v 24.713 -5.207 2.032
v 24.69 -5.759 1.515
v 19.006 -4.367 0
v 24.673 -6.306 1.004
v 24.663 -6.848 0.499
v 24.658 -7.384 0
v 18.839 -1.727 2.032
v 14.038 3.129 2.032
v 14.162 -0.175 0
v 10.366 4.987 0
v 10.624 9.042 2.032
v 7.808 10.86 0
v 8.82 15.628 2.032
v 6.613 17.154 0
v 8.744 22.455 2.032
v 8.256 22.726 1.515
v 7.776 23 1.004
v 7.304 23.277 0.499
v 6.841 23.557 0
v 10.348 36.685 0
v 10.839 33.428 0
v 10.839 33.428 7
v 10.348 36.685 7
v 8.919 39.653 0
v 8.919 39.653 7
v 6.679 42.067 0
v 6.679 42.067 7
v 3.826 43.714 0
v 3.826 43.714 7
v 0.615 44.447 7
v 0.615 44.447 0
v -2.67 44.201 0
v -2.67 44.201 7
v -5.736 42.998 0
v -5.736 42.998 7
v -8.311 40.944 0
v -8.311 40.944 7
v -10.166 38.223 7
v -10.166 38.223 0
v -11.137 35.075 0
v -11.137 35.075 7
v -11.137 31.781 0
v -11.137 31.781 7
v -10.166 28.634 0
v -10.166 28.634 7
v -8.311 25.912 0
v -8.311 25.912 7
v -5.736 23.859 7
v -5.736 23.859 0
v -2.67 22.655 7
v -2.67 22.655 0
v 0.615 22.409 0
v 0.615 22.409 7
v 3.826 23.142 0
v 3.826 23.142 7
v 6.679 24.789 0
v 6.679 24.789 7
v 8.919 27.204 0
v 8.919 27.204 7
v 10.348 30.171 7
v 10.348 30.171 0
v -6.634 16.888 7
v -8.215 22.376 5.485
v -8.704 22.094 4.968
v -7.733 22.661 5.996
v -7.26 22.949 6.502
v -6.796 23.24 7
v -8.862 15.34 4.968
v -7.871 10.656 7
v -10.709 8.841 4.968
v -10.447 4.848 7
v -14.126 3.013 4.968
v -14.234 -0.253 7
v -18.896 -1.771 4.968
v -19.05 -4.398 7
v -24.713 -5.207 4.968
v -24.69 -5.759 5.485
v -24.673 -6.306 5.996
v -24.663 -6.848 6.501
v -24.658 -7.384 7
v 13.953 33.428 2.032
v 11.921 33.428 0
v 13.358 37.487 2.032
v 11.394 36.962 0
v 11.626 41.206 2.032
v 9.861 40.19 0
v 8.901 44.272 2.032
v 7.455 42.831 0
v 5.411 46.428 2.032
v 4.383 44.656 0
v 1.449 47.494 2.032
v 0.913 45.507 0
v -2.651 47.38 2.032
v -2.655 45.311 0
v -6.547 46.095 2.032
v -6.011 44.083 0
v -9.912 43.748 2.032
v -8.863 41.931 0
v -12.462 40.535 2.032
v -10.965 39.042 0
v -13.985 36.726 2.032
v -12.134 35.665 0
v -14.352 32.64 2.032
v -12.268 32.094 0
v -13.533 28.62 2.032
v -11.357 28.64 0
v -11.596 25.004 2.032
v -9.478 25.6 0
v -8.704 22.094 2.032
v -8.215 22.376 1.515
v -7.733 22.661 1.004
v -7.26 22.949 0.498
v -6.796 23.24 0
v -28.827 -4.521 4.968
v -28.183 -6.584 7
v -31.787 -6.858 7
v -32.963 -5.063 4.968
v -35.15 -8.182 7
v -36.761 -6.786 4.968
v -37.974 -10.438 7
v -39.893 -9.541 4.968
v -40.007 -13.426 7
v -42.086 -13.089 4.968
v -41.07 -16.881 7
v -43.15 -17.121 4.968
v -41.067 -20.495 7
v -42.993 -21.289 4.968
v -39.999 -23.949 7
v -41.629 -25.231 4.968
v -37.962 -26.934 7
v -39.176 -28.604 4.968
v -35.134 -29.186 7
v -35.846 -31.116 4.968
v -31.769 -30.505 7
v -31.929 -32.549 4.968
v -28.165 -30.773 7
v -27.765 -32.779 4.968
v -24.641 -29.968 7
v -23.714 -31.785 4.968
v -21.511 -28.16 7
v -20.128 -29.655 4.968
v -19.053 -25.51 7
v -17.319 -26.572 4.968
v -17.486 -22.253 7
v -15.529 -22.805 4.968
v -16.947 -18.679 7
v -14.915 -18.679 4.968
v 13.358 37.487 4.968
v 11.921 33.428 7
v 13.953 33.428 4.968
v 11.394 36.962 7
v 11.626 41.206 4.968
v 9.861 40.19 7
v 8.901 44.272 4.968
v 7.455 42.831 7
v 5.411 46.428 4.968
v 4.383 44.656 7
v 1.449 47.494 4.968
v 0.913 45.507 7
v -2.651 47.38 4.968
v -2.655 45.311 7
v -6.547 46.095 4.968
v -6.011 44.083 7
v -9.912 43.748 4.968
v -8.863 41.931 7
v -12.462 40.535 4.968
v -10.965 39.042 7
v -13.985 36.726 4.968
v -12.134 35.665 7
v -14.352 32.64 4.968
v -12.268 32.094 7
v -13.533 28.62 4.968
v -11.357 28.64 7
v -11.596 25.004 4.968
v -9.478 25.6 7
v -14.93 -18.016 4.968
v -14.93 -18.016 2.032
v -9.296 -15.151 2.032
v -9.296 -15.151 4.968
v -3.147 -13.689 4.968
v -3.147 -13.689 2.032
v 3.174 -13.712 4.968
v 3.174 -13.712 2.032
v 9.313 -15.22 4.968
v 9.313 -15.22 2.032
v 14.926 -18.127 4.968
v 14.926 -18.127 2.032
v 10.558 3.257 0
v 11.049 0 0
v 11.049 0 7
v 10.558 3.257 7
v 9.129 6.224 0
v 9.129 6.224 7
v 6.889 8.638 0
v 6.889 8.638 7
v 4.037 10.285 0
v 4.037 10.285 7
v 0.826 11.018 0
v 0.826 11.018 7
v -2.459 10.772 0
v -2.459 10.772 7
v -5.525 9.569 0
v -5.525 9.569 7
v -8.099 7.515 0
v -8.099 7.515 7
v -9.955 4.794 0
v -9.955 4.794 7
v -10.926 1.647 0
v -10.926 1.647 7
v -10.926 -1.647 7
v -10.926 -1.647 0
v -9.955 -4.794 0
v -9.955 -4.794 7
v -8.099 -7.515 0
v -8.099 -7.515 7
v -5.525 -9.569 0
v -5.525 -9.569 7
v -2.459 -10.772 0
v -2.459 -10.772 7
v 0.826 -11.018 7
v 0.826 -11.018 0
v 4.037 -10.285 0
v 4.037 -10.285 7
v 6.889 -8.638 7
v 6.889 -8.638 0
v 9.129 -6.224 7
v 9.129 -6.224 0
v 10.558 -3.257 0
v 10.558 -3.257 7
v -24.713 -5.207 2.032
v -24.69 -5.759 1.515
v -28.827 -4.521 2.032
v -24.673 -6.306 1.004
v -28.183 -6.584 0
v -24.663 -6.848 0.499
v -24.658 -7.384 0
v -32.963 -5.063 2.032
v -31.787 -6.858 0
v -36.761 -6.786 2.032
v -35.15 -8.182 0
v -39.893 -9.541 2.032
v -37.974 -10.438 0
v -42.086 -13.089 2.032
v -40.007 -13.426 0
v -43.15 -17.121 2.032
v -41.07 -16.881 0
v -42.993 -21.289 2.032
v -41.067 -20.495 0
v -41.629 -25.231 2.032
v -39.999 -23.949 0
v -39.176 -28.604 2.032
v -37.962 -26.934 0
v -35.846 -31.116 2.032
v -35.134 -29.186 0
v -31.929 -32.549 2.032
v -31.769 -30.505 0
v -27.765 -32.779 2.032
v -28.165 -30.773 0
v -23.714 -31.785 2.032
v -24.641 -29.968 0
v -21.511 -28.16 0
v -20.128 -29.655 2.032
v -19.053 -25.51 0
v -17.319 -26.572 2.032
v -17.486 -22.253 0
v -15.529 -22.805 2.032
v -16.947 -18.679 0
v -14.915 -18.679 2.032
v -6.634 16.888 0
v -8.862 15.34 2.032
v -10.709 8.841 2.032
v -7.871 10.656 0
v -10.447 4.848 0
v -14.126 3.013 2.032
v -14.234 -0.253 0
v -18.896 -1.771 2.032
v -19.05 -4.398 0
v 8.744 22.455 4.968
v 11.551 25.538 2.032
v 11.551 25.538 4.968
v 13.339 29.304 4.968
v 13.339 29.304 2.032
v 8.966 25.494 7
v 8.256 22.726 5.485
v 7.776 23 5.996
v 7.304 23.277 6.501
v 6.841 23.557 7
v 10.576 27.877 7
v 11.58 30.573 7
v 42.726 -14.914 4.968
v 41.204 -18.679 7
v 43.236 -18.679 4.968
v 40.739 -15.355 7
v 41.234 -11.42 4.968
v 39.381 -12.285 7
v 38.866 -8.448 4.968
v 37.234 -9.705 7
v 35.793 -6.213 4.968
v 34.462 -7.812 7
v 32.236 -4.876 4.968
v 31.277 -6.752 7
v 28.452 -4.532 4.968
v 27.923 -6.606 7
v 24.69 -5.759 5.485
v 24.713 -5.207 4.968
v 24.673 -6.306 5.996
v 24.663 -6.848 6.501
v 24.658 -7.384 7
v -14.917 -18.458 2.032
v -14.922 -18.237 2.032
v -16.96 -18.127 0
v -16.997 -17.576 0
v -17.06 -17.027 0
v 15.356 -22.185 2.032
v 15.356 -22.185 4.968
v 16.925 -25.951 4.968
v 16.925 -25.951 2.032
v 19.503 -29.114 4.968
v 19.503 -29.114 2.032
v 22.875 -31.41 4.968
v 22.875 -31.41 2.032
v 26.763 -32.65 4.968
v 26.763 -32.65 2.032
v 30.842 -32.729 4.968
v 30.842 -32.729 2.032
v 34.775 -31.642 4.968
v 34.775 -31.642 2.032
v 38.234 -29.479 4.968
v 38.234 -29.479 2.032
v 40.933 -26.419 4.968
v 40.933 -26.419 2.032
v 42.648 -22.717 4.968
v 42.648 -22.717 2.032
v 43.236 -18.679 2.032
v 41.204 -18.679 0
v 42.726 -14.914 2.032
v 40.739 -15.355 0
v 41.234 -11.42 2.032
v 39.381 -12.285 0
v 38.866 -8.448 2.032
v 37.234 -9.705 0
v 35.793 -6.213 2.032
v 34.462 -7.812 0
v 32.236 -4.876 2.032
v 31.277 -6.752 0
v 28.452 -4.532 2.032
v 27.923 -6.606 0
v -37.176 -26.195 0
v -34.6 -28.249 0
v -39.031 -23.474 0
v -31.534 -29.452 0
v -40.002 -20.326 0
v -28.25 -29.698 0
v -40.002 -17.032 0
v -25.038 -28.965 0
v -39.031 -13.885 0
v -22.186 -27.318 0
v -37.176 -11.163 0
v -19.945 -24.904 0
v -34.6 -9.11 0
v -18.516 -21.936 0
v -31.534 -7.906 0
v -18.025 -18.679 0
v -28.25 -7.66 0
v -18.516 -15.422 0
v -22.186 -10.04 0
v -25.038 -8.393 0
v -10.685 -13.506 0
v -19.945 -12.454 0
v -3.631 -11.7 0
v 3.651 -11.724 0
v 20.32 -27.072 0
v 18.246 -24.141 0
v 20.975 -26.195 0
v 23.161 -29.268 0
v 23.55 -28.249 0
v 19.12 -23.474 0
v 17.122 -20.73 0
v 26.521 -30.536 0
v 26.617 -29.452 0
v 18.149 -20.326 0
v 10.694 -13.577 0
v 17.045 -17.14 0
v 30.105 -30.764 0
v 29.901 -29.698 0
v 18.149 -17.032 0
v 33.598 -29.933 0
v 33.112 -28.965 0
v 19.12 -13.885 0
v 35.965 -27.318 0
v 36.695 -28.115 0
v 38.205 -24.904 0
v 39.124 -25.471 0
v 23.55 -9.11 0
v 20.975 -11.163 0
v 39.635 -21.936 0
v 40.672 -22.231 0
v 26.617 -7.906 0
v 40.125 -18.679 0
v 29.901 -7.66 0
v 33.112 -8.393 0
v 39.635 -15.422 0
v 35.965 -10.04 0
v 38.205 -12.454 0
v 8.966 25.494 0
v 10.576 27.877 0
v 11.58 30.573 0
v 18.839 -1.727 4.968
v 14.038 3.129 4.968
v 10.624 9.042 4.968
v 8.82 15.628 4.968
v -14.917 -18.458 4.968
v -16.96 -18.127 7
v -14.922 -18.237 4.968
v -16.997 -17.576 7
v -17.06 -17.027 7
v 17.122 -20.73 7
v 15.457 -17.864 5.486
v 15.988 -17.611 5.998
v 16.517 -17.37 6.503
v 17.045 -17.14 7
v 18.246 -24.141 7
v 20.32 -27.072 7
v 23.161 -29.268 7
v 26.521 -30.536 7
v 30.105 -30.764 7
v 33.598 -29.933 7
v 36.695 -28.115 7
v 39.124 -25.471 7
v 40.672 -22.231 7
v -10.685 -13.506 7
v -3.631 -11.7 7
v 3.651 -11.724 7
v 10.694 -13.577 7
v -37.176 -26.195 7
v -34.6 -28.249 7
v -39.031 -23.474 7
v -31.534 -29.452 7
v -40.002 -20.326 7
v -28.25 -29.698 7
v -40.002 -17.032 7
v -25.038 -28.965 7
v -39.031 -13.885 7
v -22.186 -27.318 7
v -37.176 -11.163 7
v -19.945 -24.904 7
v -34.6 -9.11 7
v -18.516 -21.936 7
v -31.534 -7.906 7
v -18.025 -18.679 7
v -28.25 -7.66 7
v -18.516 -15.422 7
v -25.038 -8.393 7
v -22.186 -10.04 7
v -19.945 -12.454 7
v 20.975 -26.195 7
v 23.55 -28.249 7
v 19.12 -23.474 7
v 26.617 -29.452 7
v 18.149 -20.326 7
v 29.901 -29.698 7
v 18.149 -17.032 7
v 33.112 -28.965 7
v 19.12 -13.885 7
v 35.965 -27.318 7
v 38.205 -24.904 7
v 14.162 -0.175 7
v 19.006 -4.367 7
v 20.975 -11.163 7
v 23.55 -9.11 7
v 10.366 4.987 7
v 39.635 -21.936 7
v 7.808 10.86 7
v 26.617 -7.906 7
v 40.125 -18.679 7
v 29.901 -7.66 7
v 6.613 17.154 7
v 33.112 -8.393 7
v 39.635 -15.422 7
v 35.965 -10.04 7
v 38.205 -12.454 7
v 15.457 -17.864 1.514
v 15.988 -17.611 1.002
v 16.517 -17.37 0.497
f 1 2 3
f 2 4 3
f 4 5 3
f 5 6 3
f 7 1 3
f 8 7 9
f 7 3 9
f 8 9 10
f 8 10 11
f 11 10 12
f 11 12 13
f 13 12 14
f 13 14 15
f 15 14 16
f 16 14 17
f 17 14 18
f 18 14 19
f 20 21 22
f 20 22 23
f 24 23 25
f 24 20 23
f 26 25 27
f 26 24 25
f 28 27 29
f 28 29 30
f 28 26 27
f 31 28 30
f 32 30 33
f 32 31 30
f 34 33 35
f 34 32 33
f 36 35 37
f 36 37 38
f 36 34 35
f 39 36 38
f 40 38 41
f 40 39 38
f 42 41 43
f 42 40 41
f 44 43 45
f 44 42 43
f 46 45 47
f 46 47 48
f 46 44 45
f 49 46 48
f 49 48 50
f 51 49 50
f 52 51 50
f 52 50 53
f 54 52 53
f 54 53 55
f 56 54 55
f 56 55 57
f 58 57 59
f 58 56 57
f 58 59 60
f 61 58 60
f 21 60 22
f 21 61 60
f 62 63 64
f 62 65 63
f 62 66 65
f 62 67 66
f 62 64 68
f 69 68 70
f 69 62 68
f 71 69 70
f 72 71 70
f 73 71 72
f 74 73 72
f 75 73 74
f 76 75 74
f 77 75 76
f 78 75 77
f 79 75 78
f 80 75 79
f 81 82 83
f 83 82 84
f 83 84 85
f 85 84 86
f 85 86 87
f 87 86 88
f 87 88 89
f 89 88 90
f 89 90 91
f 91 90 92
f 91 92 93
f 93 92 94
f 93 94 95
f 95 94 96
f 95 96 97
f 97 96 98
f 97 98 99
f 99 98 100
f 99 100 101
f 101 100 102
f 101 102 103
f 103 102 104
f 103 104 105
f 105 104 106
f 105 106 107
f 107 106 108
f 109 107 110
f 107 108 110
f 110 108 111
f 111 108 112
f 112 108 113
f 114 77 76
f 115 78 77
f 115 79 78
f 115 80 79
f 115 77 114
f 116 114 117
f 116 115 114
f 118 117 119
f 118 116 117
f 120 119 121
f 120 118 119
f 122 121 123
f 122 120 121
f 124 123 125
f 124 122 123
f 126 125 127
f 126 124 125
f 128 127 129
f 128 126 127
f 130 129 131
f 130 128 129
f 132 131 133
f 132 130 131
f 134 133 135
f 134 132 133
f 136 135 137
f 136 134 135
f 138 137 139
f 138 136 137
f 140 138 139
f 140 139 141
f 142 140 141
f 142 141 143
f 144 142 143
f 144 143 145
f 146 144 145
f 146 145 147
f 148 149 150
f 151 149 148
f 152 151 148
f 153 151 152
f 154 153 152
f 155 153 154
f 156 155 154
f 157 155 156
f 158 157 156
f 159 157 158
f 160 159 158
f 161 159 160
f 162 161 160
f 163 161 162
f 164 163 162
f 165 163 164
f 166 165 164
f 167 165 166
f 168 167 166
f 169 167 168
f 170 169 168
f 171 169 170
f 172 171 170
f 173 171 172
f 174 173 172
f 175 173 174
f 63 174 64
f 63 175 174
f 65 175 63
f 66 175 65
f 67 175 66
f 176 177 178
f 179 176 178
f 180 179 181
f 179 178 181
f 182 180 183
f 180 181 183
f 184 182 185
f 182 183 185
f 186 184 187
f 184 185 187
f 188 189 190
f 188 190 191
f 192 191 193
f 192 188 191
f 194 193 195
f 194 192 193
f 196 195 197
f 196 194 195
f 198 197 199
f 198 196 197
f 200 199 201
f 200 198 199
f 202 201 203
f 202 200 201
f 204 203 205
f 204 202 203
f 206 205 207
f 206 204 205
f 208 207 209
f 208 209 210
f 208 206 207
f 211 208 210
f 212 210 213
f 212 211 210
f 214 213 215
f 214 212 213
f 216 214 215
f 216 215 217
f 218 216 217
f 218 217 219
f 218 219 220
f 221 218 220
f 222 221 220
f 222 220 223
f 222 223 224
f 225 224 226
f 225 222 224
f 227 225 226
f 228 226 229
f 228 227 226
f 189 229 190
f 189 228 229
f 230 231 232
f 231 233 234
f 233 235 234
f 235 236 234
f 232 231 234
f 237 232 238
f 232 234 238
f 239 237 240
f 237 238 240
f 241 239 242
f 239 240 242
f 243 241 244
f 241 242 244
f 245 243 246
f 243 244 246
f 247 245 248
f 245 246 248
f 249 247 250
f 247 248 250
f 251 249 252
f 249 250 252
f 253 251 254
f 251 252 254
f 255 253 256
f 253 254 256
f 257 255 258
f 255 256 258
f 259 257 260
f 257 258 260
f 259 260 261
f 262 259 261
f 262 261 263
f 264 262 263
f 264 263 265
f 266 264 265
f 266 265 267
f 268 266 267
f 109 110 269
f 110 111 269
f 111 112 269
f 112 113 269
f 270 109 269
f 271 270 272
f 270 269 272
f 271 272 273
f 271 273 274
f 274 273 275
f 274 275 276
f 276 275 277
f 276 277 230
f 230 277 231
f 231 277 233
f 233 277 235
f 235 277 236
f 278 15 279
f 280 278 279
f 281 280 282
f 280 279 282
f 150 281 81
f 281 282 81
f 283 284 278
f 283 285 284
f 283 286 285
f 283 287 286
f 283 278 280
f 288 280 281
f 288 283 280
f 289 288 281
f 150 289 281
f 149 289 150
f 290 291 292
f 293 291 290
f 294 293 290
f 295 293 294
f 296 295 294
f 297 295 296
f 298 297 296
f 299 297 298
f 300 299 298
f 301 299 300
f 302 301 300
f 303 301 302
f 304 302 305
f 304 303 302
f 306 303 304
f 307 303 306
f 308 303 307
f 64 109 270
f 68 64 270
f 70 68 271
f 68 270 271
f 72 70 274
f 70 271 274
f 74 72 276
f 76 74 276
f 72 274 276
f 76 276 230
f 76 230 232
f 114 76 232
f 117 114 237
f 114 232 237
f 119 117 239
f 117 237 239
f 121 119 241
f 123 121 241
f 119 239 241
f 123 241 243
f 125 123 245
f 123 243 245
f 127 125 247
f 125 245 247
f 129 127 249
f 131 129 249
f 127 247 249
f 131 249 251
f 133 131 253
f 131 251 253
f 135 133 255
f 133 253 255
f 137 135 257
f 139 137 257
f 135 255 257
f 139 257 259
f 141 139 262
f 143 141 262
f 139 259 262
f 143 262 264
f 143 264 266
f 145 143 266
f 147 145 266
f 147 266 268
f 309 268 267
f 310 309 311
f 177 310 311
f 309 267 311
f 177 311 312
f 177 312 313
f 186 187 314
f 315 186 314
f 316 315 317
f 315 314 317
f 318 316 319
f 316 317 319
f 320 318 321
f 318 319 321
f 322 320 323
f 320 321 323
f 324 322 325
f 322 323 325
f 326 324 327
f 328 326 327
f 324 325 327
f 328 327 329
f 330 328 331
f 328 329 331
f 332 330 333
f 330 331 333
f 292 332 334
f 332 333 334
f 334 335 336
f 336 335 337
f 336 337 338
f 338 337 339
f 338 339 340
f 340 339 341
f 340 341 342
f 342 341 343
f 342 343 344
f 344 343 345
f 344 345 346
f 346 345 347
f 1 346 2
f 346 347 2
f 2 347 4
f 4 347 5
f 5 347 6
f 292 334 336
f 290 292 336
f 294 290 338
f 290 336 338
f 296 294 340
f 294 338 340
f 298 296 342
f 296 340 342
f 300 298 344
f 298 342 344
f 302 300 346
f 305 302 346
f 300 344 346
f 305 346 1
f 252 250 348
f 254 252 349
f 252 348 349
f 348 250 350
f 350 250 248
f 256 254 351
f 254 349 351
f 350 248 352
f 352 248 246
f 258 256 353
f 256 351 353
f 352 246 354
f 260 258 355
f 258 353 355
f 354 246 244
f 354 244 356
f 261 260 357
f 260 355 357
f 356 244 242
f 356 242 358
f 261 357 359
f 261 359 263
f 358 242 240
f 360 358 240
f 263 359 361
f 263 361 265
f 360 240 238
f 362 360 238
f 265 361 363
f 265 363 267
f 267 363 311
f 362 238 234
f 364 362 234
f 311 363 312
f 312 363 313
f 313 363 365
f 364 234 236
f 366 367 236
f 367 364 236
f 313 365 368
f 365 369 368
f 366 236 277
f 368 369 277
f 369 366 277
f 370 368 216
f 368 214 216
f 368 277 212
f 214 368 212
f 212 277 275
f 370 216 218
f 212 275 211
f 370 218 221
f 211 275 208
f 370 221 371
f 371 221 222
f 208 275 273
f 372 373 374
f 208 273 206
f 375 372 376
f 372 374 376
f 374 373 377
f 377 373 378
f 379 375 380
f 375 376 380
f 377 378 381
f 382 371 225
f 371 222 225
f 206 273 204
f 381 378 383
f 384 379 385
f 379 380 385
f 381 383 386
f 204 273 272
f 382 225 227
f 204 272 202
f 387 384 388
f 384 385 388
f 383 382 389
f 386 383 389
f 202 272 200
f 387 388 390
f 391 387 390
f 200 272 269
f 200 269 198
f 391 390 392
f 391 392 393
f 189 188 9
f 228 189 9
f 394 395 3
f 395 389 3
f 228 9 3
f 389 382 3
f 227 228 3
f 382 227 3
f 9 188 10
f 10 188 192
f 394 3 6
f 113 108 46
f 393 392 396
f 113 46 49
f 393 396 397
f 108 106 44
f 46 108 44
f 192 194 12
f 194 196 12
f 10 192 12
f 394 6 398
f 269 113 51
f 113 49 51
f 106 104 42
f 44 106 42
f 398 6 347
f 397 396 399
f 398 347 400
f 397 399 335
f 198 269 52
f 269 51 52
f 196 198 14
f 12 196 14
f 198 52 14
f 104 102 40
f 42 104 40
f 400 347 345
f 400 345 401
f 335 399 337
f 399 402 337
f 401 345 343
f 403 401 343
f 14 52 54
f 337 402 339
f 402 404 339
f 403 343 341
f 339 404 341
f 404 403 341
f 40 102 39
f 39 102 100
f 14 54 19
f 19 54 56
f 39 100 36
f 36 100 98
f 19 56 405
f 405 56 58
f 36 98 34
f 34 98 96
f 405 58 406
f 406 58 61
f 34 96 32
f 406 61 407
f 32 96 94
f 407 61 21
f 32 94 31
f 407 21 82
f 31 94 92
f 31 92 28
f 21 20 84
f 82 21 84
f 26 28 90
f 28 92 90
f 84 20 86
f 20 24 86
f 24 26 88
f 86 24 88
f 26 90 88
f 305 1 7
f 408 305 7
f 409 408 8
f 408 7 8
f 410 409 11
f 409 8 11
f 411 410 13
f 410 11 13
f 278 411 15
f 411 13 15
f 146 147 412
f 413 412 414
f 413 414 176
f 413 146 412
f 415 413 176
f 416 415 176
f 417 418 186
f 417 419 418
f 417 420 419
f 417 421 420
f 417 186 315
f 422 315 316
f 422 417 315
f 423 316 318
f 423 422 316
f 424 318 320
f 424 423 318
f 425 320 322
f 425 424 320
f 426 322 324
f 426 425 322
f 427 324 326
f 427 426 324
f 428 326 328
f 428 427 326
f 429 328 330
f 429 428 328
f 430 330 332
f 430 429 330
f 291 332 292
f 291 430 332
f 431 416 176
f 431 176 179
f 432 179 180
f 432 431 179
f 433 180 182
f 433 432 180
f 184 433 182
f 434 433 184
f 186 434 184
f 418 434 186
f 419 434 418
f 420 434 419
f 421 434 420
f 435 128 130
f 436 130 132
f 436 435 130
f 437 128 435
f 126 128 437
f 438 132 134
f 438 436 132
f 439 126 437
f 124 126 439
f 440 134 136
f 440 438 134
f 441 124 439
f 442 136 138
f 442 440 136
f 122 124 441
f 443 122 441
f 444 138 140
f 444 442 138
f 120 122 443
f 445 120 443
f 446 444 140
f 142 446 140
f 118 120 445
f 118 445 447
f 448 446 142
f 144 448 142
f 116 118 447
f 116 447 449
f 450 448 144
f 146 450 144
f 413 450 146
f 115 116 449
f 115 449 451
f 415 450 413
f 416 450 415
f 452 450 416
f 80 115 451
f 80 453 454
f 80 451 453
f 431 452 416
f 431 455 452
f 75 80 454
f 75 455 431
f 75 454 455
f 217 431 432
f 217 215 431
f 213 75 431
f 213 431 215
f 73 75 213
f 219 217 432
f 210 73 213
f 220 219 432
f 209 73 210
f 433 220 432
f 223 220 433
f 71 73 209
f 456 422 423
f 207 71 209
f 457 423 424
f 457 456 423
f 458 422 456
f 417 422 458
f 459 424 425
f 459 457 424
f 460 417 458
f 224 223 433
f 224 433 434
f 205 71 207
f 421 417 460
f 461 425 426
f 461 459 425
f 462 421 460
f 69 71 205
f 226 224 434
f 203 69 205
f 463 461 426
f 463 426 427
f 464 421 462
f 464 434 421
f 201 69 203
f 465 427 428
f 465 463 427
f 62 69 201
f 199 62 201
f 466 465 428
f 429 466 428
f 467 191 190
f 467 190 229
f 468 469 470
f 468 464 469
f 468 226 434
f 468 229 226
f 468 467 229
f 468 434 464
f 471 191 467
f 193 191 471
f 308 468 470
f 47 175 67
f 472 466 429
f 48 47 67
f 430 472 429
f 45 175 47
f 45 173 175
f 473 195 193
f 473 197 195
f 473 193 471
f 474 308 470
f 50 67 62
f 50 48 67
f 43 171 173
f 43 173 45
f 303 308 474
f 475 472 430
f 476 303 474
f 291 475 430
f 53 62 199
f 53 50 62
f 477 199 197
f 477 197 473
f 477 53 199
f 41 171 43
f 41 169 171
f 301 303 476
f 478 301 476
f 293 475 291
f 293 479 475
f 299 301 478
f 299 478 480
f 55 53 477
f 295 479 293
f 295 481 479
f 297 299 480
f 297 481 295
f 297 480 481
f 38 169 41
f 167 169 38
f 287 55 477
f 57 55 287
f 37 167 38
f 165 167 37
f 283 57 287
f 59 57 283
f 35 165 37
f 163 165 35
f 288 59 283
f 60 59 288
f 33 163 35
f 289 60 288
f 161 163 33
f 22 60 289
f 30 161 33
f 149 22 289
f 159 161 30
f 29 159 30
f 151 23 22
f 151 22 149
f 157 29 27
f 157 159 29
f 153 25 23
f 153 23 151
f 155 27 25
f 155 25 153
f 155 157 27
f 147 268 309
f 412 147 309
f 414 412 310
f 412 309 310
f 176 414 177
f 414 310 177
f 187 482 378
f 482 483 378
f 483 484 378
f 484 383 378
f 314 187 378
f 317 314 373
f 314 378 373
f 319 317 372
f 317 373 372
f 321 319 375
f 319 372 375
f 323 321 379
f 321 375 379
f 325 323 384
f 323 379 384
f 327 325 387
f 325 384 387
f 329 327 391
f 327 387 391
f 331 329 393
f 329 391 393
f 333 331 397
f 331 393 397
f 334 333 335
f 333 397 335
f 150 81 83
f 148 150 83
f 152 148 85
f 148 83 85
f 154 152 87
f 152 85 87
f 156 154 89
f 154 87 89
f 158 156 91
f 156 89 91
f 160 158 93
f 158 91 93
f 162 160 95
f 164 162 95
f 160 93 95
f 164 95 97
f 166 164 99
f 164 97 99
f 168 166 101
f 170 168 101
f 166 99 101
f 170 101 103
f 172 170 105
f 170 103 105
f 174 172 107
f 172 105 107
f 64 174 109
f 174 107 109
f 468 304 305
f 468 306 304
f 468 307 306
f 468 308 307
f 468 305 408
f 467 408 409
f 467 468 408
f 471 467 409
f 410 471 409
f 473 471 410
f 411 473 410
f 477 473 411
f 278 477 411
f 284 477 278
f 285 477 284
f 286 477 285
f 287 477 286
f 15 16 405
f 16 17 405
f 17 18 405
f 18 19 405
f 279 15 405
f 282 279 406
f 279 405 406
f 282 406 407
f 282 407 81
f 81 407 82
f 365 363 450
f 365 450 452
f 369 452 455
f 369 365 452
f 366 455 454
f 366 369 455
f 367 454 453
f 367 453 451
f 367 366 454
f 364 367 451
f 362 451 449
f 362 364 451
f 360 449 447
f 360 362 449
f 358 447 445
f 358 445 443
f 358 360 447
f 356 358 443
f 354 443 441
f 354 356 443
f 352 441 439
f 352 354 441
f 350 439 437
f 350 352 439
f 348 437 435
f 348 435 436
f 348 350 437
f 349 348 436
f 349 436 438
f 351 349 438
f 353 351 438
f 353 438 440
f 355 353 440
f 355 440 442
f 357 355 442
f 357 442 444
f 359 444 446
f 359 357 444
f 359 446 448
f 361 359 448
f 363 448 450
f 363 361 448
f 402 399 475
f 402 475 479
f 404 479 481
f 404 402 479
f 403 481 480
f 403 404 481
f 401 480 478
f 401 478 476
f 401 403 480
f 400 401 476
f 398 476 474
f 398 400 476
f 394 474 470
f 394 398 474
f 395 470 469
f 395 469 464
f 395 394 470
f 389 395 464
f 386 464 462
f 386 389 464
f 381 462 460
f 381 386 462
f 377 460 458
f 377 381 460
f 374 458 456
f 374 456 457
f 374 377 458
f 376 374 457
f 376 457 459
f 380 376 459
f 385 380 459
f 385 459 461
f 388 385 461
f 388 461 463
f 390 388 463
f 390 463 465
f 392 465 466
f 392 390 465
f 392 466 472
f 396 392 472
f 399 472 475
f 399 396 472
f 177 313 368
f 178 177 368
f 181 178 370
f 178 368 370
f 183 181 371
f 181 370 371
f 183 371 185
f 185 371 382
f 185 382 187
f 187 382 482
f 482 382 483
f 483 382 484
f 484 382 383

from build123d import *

# Parameters (mm, degrees)
F0_R     = 11.049
F0_R_2   = 11.05
F1_DEPTH = 7
F2_SIZE  = 2.032


# Not quite as in the source:
# - a feature names something its author has since deleted; it is built from what else it names


with BuildPart() as f1:
    # F0 (on Top) → F1 (new body)
    with BuildSketch(Plane.XY):
        with BuildLine():
            ThreePointArc((-8.7042735718, 22.0943097642), (-12.2328176499, 5.8189544339), (-24.7131356106, -5.2073540163))
            ThreePointArc((-24.7131356106, -5.2073540163), (-17.821671092, -10.084264276), (-14.930456808, -18.0163142542))
            ThreePointArc((-14.930456808, -18.0163142542), (0.0145480917, -13.5128951169), (14.9256967567, -18.1271773868))
            ThreePointArc((14.9256967567, -18.1271773868), (17.7880815001, -10.1284239204), (24.7131356106, -5.2073540163))
            ThreePointArc((24.7131356106, -5.2073540163), (12.1415366781, 5.9758444424), (8.7441728022, 22.4551328426))
            ThreePointArc((8.7441728022, 22.4551328426), (0.0821273079, 19.2679731194), (-8.7042735718, 22.0943097642))
        make_face()
        Circle(F0_R, mode=Mode.SUBTRACT)
        with BuildLine():
            ThreePointArc((-14.930456808, -18.0163142542), (-17.821671092, -10.084264276), (-24.7131356106, -5.2073540163))
            ThreePointArc((-24.7131356106, -5.2073540163), (-40.5273347614, -27.0082695647), (-14.9149335915, -18.6791807883))
            ThreePointArc((-14.9149335915, -18.6791807883), (-14.9188149276, -18.3476566518), (-14.930456808, -18.0163142542))
        make_face()
        with Locations((-29.0754335915, -18.6791807883)):
            Circle(F0_R_2, mode=Mode.SUBTRACT)
        with BuildLine():
            ThreePointArc((13.9525783408, 33.428221941), (-6.5471611927, 46.095014193), (-8.7042735718, 22.0943097642))
            ThreePointArc((-8.7042735718, 22.0943097642), (0.0821273079, 19.2679731194), (8.7441728022, 22.4551328426))
            ThreePointArc((8.7441728022, 22.4551328426), (12.5843929813, 27.3549984844), (13.9525783408, 33.428221941))
        make_face()
        with Locations((-0.2106978791, 33.428221941)):
            Circle(F0_R_2, mode=Mode.SUBTRACT)
        with BuildLine():
            ThreePointArc((24.7131356106, -5.2073540163), (17.7880815001, -10.1284239204), (14.9256967567, -18.1271773868))
            ThreePointArc((14.9256967567, -18.1271773868), (28.7993794297, -32.8369897413), (43.2359335915, -18.6791807883))
            ThreePointArc((43.2359335915, -18.6791807883), (37.404522368, -7.2272796184), (24.7131356106, -5.2073540163))
        make_face()
        with Locations((29.0754335915, -18.6791807883)):
            Circle(F0_R_2, mode=Mode.SUBTRACT)
    extrude(amount=F1_DEPTH)

    # F2
    f2_edges = [f1.edges().sort_by_distance(p)[0] for p in [
        (-12.232818, 5.818954, 7),
        (12.141537, 5.975844, 7),
        (0.014548, -13.512895, 7),
        (0.014548, -13.512895, 0),
        (12.141537, 5.975844, 0),
        (-12.232818, 5.818954, 0),
        (-40.329196, -27.274097, 0),
        (40.362786, -27.229938, 0),
        (-0.503523, 47.588471, 0),
        (-40.329196, -27.274097, 7),
        (40.362786, -27.229938, 7),
        (-0.503523, 47.588471, 7),
    ]]
    chamfer(f2_edges, length=F2_SIZE)


solid = f1.part
